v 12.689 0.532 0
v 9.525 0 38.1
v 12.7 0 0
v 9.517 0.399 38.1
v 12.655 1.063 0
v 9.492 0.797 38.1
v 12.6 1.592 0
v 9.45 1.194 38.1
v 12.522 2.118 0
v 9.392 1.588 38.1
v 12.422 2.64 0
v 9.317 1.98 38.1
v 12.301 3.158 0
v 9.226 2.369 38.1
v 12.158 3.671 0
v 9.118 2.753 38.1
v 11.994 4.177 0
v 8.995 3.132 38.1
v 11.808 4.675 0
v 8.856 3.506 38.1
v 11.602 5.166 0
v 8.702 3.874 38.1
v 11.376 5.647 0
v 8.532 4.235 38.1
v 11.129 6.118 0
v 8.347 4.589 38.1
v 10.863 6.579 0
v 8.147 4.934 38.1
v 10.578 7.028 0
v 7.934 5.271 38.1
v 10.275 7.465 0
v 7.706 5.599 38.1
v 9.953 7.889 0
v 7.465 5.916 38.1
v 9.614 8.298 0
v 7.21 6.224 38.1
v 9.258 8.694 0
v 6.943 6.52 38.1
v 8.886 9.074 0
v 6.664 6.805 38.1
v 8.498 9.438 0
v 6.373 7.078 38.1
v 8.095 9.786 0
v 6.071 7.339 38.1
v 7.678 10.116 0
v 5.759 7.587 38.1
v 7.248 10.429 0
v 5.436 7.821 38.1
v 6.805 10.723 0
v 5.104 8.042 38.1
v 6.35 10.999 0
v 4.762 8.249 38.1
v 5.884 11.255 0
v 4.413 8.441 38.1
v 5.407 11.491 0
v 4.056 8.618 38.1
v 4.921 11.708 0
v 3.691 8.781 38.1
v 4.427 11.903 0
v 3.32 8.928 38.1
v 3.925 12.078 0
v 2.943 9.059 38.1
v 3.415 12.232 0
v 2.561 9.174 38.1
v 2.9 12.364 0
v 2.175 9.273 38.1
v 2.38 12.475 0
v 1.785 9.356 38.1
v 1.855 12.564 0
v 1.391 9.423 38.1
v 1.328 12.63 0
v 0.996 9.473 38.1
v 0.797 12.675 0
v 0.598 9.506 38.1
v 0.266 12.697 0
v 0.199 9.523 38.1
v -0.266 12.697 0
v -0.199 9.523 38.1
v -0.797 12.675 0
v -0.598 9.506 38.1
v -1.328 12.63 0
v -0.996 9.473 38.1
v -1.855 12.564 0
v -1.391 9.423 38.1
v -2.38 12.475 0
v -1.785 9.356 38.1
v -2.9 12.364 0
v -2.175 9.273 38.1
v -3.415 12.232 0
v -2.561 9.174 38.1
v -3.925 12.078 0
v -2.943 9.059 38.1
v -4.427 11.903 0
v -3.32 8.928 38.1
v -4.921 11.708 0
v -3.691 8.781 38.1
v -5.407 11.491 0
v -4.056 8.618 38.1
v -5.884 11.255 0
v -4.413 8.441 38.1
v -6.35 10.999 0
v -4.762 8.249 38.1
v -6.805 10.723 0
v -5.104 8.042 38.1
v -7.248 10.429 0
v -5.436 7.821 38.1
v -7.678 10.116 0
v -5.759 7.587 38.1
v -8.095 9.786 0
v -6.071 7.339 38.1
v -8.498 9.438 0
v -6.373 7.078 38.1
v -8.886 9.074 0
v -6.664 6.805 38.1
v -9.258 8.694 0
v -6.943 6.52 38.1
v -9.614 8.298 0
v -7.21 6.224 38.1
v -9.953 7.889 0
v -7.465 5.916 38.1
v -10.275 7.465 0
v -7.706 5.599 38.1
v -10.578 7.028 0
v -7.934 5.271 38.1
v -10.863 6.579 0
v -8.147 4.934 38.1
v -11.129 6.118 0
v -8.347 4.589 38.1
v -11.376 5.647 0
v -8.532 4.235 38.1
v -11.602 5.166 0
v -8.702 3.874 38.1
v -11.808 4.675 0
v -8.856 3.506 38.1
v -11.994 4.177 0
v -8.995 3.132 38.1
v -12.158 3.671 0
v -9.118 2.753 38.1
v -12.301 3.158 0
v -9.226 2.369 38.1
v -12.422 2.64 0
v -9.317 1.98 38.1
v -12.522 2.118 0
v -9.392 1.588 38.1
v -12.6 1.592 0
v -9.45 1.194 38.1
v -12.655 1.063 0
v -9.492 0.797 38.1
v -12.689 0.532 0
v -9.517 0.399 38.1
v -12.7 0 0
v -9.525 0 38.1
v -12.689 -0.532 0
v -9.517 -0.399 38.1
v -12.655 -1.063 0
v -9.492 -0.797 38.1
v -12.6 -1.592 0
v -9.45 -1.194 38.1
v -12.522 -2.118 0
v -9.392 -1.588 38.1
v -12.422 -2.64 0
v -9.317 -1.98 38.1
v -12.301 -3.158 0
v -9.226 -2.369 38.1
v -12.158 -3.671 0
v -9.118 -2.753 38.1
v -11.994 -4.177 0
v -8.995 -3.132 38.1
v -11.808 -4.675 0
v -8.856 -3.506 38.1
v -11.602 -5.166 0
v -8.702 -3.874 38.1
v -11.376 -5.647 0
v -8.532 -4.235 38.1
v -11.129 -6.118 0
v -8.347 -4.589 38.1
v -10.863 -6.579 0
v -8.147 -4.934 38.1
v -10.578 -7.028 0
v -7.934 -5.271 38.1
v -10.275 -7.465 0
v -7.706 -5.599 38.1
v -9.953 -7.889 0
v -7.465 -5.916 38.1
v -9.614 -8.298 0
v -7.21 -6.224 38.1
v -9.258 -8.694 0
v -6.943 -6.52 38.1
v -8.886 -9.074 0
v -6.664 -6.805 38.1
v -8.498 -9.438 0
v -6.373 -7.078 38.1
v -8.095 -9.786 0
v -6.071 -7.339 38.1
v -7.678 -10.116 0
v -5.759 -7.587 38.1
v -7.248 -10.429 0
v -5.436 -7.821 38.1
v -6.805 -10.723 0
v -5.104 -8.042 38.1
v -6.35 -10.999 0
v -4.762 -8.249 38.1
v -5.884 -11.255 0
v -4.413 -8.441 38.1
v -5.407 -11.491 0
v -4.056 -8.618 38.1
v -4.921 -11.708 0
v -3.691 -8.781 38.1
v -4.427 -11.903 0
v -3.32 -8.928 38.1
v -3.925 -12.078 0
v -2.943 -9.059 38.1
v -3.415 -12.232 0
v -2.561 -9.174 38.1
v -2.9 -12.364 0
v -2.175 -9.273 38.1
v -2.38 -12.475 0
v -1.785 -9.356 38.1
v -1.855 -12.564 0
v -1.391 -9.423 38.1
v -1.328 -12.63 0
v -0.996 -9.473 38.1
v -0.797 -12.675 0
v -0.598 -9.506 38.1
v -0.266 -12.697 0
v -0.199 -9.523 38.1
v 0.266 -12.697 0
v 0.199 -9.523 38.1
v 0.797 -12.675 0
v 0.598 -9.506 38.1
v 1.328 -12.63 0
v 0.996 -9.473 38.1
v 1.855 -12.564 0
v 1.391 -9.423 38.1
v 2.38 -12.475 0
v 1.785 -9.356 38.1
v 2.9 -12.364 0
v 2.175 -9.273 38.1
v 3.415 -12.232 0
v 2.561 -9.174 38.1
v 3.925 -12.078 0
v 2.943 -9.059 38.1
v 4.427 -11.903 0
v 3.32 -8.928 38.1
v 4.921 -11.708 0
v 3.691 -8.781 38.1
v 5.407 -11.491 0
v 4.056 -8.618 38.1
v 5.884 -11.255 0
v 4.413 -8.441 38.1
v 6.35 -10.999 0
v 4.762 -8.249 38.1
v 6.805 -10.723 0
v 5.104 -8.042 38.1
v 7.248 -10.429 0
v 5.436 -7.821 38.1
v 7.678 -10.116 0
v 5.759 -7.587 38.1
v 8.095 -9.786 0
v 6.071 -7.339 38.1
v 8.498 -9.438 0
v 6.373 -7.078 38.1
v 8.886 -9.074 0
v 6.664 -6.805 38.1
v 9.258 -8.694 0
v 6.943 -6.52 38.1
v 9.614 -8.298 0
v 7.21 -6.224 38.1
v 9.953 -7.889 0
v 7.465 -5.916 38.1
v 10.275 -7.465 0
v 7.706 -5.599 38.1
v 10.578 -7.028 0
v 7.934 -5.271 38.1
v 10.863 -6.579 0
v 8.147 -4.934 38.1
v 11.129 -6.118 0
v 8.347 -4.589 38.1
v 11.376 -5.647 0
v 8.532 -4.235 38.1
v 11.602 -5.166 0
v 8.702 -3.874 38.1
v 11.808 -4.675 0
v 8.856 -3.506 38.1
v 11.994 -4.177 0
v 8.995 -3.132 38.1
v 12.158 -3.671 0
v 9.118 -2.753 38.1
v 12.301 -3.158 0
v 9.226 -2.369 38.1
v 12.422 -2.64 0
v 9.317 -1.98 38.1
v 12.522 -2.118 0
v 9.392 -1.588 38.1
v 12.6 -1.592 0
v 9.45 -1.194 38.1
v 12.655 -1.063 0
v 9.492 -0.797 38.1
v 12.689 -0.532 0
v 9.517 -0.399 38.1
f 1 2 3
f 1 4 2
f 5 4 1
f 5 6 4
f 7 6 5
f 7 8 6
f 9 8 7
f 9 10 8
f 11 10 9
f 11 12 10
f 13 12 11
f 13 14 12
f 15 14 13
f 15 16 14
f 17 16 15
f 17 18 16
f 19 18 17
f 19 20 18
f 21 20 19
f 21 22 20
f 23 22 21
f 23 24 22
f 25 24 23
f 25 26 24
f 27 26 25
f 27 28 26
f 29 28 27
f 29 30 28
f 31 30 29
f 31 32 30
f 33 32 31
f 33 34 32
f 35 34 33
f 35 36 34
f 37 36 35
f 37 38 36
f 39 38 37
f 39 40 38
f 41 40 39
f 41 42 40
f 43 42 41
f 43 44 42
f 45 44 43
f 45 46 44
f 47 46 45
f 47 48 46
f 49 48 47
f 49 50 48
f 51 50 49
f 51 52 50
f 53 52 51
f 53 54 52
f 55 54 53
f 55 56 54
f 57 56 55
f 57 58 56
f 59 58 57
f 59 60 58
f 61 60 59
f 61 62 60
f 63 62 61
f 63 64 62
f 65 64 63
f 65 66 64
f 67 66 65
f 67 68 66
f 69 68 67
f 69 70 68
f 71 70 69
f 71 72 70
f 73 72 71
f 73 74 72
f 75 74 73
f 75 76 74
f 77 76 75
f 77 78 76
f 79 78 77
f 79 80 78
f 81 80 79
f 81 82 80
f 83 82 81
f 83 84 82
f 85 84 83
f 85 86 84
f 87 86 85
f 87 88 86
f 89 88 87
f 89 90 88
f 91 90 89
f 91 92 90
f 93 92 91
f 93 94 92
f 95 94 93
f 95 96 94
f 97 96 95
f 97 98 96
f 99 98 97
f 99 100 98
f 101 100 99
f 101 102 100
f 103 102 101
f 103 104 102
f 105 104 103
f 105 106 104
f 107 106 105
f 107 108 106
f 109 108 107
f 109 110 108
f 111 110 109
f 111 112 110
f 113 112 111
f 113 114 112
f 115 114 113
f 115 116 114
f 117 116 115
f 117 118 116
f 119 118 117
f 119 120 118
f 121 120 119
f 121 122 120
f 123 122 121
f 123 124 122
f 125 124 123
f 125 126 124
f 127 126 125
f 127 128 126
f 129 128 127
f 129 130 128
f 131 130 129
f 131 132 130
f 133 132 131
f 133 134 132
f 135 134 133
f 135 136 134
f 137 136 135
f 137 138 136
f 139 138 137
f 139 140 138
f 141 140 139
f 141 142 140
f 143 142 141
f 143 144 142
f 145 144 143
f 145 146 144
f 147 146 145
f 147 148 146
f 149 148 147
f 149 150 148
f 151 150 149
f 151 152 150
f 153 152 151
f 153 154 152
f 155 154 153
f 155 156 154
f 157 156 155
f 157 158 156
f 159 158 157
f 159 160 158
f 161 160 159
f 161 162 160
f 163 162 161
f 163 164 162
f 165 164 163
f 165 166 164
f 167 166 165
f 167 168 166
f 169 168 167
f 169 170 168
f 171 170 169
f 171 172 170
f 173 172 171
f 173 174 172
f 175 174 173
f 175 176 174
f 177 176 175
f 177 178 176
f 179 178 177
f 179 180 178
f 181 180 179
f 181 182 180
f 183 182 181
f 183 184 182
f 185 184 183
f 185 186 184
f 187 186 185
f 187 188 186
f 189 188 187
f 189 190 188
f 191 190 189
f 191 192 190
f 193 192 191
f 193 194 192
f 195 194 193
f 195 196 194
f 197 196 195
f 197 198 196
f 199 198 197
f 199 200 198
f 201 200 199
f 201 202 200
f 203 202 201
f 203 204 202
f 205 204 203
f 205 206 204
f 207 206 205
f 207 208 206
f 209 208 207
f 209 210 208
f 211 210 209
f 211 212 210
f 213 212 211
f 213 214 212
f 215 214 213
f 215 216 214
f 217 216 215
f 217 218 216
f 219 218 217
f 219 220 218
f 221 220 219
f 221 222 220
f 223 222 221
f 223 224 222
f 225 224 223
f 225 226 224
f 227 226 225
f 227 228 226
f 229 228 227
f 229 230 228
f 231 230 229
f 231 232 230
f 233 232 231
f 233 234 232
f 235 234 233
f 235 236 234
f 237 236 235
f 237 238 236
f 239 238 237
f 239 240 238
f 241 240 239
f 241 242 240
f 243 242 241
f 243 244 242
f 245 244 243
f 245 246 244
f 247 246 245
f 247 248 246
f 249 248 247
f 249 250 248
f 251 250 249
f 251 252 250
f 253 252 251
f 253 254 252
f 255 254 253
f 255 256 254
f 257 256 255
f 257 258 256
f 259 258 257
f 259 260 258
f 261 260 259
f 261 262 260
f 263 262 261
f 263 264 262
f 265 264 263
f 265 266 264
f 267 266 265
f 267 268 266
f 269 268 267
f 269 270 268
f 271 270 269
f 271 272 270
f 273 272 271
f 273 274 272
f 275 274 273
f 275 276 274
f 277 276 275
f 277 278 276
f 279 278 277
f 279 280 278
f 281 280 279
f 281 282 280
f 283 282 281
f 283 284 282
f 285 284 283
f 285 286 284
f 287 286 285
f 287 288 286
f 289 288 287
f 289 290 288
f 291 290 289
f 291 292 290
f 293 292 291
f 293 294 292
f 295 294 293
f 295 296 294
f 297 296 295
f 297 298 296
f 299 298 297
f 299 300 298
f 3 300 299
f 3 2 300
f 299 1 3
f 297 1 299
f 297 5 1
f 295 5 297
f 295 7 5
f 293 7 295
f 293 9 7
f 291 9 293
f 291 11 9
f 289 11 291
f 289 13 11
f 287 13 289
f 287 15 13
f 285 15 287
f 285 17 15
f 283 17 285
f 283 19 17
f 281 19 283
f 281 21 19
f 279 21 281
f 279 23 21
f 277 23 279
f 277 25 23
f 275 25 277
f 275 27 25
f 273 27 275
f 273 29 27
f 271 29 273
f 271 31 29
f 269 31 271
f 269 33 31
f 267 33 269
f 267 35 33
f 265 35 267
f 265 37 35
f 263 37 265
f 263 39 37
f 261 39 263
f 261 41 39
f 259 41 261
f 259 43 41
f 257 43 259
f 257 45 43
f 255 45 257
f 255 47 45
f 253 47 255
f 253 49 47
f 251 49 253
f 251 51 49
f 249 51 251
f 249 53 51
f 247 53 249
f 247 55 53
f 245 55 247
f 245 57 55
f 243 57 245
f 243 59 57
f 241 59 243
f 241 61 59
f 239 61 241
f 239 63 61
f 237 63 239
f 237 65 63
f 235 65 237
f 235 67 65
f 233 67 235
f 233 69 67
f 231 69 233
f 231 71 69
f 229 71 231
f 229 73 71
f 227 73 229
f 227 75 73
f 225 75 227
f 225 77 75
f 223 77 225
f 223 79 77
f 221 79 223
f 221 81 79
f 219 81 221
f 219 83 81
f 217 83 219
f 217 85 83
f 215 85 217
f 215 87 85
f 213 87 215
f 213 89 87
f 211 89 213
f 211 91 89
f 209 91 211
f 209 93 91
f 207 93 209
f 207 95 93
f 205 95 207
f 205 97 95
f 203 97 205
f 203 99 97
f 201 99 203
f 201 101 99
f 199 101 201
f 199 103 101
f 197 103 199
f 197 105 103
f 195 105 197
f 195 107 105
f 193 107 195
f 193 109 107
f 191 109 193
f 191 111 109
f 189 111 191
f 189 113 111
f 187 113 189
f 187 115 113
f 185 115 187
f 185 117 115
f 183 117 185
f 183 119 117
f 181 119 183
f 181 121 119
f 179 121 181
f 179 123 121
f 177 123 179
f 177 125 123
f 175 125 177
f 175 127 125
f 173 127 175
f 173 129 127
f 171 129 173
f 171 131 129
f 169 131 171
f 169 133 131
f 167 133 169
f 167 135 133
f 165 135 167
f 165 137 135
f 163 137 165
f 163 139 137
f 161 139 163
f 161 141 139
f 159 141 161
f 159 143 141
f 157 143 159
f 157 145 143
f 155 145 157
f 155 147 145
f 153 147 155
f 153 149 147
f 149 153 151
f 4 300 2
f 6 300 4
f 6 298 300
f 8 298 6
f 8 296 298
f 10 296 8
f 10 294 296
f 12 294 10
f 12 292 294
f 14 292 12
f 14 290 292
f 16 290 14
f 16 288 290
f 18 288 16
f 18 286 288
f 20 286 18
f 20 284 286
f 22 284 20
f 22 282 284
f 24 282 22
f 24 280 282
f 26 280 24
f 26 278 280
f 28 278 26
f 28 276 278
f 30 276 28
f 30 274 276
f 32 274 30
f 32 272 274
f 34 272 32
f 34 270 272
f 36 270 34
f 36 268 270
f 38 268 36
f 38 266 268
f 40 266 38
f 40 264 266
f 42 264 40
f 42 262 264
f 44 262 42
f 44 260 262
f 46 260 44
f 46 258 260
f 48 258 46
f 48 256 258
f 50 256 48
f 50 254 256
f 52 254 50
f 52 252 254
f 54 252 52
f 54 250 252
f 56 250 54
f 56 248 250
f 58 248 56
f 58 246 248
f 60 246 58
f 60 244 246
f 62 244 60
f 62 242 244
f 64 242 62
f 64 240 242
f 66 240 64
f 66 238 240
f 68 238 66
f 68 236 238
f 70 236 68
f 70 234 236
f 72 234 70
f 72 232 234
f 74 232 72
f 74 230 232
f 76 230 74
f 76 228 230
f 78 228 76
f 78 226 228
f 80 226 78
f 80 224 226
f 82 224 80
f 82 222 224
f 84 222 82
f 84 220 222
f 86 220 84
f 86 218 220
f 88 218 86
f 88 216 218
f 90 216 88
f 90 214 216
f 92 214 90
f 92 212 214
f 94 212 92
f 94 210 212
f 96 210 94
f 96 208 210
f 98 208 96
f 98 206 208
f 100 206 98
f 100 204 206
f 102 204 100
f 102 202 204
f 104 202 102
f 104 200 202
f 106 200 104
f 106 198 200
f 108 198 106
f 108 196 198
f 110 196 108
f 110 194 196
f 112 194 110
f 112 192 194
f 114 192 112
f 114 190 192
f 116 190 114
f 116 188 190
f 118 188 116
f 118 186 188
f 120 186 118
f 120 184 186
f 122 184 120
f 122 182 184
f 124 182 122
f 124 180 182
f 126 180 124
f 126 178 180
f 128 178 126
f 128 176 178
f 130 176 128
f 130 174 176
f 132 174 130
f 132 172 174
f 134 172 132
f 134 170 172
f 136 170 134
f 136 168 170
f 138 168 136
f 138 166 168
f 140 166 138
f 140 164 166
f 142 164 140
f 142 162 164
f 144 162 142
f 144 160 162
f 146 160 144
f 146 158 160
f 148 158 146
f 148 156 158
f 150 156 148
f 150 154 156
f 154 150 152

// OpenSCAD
$fn = 150;

cylinder(d1 = 25.4, d2 = 19.049999999999997, h = 38.099999999999994);
